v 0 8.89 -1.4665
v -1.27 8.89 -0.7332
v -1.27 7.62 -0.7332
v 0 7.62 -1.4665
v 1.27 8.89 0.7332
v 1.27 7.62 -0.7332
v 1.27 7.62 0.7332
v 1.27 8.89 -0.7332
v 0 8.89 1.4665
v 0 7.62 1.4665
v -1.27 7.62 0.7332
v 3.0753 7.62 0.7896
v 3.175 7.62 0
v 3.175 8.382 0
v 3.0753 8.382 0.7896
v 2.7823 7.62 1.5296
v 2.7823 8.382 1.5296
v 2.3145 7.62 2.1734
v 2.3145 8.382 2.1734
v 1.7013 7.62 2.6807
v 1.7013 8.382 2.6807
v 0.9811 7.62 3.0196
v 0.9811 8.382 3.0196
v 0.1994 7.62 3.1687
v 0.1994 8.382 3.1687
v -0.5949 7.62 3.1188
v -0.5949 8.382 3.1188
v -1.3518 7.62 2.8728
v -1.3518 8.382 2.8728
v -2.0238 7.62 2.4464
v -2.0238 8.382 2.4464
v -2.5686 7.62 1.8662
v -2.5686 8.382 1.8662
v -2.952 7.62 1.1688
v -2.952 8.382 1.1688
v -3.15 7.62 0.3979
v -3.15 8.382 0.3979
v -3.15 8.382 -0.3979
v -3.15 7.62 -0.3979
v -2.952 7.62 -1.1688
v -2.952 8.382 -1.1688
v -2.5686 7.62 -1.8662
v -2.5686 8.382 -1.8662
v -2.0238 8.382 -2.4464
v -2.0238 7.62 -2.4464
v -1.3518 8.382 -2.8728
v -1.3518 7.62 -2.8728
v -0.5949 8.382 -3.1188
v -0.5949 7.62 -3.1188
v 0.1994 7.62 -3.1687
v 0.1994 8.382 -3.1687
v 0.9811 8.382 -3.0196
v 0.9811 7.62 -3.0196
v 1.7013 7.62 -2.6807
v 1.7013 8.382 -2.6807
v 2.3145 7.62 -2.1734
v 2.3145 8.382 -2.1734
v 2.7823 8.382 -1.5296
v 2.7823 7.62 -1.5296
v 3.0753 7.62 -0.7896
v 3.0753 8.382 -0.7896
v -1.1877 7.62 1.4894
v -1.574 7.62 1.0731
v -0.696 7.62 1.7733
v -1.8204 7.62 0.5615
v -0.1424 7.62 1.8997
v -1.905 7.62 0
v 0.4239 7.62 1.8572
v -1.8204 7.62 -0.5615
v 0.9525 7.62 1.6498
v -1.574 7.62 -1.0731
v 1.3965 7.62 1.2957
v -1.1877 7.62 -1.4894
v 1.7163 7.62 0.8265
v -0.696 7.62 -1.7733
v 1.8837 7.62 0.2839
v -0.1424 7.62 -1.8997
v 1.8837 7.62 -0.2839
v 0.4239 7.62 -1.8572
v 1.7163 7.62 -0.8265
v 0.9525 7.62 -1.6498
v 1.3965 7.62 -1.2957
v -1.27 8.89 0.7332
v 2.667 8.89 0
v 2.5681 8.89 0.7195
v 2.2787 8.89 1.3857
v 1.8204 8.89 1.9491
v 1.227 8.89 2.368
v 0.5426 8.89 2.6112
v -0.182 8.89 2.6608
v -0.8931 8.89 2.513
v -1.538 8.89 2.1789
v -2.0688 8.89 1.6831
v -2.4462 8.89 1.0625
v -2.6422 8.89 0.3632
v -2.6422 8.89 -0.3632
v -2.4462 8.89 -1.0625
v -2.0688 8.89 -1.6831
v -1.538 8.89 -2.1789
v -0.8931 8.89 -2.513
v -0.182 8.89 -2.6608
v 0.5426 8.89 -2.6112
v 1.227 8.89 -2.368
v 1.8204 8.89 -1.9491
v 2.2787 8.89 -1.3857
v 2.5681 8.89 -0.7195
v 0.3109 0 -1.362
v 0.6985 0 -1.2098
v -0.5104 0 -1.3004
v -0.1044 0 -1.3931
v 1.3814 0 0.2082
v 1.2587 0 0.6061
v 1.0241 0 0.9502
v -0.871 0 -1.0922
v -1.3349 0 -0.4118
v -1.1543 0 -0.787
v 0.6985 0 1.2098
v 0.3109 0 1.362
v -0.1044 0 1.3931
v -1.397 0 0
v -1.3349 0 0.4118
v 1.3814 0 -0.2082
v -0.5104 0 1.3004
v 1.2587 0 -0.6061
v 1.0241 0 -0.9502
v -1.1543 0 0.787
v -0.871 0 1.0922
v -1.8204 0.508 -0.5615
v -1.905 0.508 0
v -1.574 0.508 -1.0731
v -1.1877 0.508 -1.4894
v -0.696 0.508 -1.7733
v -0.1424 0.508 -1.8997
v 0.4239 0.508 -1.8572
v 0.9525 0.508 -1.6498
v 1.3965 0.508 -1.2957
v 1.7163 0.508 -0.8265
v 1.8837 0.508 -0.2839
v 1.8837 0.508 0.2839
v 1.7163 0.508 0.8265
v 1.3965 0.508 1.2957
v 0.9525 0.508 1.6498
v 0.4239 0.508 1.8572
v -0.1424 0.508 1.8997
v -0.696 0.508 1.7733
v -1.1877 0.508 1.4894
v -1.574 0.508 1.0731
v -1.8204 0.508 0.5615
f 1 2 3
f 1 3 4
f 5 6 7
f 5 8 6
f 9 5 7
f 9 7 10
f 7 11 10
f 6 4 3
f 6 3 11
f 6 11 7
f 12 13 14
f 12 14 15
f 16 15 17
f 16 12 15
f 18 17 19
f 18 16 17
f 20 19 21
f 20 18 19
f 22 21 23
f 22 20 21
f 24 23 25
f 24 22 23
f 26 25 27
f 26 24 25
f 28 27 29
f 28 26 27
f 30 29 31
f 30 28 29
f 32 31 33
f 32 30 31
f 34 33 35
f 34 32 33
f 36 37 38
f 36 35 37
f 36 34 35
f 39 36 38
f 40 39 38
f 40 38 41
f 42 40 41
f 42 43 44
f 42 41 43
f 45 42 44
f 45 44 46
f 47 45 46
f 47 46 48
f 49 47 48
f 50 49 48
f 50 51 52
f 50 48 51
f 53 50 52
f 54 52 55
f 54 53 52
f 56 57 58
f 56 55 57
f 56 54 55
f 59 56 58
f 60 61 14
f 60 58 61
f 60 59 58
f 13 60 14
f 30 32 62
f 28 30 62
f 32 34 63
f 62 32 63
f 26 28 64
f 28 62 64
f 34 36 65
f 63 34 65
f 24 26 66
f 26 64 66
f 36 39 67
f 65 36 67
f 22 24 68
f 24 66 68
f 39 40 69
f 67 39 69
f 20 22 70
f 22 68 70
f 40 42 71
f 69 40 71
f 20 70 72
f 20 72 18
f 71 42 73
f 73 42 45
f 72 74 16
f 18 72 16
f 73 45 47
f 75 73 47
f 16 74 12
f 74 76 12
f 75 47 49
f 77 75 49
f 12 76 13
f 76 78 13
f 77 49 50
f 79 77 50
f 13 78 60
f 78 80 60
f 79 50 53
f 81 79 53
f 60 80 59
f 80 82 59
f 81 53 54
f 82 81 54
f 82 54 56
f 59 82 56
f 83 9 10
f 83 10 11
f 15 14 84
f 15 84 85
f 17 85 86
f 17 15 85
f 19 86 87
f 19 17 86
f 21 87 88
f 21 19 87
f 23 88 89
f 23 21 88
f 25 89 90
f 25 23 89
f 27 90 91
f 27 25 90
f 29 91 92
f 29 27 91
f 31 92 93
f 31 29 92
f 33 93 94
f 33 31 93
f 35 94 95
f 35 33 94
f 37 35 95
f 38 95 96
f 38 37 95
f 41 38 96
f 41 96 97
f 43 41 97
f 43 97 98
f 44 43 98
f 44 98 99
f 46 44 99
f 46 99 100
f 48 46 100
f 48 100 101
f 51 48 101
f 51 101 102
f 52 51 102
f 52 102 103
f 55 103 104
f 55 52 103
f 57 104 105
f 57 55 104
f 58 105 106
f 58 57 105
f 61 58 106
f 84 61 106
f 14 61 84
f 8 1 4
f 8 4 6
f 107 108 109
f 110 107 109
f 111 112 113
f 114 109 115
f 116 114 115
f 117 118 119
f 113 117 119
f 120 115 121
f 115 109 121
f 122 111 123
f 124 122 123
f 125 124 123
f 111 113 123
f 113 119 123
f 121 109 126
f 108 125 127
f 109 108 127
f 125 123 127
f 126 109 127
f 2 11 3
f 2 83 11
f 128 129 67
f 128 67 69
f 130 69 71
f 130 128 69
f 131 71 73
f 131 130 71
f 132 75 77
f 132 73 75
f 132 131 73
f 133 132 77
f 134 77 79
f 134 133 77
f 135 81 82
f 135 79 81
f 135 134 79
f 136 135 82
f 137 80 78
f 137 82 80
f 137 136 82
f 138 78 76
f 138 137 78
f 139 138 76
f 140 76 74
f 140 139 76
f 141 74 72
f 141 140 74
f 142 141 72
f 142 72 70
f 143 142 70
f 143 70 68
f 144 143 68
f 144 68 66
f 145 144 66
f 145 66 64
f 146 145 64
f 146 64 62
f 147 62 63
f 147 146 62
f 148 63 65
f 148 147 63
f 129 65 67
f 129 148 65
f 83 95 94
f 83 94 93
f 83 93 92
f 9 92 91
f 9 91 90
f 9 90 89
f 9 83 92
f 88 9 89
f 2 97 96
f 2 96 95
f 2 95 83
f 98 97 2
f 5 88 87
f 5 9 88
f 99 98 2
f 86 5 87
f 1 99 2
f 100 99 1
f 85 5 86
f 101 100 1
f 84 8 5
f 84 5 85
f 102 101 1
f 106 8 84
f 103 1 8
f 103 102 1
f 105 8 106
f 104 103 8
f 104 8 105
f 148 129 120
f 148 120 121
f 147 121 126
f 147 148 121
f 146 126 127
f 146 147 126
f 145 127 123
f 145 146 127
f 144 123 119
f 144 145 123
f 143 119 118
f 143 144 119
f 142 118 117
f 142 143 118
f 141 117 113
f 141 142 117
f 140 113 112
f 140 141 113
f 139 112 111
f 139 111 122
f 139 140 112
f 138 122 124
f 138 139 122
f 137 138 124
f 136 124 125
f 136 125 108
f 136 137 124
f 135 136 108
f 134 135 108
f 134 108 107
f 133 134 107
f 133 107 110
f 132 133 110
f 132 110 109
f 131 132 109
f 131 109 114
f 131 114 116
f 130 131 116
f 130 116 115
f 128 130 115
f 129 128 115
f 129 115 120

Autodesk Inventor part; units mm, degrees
ref_plane "YZ Plane" through (0, 0, 0) normal (1, 0, 0) x (0, 1, 0)
ref_plane "XZ Plane" through (0, 0, 0) normal (0, 1, 0) x (-1, 0, 0)
ref_plane "XY Plane" through (0, 0, 0) normal (0, 0, 1) x (1, 0, 0)
sketch "Sketch1" plane through (0, 0, 0) normal (0, 1, 0) x (-1, 0, 0)
  point P0 (0, 0)
sketch "Sketch2" plane through (0, 0, 0) normal (0, 1, 0) x (-1, 0, 0)
  circle A0 centre (0, 0) radius 1.905
  dimension "d0" = 3.81
extrude "Extrusion1" add sketch "Sketch2" along normal blind 7.62
chamfer "Chamfer1" distance 0.508 angle 45 1 edges at (1.905, 0, 0)
sketch "Sketch3" plane through (0, 7.62, 0) normal (0, 1, 0) x (1, 0, 0)
  circle A0 centre (0, 0) radius 3.175
  dimension "d6" = 6.35
extrude "Extrusion2" add sketch "Sketch3" along normal blind 1.27
chamfer "Chamfer2" distance 0.508 angle 45 1 edges at (-3.175, 8.89, 0)
thread "Thread1" size "M1.6x0.35" class "6g" standard "ISO Metric profile" length 5.08
sketch "Sketch4" plane through (0, 8.89, 0) normal (0, 1, 0) x (1, 0, 0)
  line L0 (0, -1.4665) -> (-1.27, -0.7332)
  line L1 (-1.27, -0.7332) -> (-1.27, 0.7332)
  line L2 (-1.27, 0.7332) -> (0, 1.4665)
  line L3 (0, 1.4665) -> (1.27, 0.7332)
  line L4 (1.27, 0.7332) -> (1.27, -0.7332)
  line L5 (1.27, -0.7332) -> (0, -1.4665)
  point P0 (0, 0)
  point P1 (0, 0)
  dimension "d14" = 2.54
extrude "Extrusion3" cut sketch "Sketch4" against normal blind 1.27
properties part number "Train_003_PracticeBolt" material "Stainless Steel"
